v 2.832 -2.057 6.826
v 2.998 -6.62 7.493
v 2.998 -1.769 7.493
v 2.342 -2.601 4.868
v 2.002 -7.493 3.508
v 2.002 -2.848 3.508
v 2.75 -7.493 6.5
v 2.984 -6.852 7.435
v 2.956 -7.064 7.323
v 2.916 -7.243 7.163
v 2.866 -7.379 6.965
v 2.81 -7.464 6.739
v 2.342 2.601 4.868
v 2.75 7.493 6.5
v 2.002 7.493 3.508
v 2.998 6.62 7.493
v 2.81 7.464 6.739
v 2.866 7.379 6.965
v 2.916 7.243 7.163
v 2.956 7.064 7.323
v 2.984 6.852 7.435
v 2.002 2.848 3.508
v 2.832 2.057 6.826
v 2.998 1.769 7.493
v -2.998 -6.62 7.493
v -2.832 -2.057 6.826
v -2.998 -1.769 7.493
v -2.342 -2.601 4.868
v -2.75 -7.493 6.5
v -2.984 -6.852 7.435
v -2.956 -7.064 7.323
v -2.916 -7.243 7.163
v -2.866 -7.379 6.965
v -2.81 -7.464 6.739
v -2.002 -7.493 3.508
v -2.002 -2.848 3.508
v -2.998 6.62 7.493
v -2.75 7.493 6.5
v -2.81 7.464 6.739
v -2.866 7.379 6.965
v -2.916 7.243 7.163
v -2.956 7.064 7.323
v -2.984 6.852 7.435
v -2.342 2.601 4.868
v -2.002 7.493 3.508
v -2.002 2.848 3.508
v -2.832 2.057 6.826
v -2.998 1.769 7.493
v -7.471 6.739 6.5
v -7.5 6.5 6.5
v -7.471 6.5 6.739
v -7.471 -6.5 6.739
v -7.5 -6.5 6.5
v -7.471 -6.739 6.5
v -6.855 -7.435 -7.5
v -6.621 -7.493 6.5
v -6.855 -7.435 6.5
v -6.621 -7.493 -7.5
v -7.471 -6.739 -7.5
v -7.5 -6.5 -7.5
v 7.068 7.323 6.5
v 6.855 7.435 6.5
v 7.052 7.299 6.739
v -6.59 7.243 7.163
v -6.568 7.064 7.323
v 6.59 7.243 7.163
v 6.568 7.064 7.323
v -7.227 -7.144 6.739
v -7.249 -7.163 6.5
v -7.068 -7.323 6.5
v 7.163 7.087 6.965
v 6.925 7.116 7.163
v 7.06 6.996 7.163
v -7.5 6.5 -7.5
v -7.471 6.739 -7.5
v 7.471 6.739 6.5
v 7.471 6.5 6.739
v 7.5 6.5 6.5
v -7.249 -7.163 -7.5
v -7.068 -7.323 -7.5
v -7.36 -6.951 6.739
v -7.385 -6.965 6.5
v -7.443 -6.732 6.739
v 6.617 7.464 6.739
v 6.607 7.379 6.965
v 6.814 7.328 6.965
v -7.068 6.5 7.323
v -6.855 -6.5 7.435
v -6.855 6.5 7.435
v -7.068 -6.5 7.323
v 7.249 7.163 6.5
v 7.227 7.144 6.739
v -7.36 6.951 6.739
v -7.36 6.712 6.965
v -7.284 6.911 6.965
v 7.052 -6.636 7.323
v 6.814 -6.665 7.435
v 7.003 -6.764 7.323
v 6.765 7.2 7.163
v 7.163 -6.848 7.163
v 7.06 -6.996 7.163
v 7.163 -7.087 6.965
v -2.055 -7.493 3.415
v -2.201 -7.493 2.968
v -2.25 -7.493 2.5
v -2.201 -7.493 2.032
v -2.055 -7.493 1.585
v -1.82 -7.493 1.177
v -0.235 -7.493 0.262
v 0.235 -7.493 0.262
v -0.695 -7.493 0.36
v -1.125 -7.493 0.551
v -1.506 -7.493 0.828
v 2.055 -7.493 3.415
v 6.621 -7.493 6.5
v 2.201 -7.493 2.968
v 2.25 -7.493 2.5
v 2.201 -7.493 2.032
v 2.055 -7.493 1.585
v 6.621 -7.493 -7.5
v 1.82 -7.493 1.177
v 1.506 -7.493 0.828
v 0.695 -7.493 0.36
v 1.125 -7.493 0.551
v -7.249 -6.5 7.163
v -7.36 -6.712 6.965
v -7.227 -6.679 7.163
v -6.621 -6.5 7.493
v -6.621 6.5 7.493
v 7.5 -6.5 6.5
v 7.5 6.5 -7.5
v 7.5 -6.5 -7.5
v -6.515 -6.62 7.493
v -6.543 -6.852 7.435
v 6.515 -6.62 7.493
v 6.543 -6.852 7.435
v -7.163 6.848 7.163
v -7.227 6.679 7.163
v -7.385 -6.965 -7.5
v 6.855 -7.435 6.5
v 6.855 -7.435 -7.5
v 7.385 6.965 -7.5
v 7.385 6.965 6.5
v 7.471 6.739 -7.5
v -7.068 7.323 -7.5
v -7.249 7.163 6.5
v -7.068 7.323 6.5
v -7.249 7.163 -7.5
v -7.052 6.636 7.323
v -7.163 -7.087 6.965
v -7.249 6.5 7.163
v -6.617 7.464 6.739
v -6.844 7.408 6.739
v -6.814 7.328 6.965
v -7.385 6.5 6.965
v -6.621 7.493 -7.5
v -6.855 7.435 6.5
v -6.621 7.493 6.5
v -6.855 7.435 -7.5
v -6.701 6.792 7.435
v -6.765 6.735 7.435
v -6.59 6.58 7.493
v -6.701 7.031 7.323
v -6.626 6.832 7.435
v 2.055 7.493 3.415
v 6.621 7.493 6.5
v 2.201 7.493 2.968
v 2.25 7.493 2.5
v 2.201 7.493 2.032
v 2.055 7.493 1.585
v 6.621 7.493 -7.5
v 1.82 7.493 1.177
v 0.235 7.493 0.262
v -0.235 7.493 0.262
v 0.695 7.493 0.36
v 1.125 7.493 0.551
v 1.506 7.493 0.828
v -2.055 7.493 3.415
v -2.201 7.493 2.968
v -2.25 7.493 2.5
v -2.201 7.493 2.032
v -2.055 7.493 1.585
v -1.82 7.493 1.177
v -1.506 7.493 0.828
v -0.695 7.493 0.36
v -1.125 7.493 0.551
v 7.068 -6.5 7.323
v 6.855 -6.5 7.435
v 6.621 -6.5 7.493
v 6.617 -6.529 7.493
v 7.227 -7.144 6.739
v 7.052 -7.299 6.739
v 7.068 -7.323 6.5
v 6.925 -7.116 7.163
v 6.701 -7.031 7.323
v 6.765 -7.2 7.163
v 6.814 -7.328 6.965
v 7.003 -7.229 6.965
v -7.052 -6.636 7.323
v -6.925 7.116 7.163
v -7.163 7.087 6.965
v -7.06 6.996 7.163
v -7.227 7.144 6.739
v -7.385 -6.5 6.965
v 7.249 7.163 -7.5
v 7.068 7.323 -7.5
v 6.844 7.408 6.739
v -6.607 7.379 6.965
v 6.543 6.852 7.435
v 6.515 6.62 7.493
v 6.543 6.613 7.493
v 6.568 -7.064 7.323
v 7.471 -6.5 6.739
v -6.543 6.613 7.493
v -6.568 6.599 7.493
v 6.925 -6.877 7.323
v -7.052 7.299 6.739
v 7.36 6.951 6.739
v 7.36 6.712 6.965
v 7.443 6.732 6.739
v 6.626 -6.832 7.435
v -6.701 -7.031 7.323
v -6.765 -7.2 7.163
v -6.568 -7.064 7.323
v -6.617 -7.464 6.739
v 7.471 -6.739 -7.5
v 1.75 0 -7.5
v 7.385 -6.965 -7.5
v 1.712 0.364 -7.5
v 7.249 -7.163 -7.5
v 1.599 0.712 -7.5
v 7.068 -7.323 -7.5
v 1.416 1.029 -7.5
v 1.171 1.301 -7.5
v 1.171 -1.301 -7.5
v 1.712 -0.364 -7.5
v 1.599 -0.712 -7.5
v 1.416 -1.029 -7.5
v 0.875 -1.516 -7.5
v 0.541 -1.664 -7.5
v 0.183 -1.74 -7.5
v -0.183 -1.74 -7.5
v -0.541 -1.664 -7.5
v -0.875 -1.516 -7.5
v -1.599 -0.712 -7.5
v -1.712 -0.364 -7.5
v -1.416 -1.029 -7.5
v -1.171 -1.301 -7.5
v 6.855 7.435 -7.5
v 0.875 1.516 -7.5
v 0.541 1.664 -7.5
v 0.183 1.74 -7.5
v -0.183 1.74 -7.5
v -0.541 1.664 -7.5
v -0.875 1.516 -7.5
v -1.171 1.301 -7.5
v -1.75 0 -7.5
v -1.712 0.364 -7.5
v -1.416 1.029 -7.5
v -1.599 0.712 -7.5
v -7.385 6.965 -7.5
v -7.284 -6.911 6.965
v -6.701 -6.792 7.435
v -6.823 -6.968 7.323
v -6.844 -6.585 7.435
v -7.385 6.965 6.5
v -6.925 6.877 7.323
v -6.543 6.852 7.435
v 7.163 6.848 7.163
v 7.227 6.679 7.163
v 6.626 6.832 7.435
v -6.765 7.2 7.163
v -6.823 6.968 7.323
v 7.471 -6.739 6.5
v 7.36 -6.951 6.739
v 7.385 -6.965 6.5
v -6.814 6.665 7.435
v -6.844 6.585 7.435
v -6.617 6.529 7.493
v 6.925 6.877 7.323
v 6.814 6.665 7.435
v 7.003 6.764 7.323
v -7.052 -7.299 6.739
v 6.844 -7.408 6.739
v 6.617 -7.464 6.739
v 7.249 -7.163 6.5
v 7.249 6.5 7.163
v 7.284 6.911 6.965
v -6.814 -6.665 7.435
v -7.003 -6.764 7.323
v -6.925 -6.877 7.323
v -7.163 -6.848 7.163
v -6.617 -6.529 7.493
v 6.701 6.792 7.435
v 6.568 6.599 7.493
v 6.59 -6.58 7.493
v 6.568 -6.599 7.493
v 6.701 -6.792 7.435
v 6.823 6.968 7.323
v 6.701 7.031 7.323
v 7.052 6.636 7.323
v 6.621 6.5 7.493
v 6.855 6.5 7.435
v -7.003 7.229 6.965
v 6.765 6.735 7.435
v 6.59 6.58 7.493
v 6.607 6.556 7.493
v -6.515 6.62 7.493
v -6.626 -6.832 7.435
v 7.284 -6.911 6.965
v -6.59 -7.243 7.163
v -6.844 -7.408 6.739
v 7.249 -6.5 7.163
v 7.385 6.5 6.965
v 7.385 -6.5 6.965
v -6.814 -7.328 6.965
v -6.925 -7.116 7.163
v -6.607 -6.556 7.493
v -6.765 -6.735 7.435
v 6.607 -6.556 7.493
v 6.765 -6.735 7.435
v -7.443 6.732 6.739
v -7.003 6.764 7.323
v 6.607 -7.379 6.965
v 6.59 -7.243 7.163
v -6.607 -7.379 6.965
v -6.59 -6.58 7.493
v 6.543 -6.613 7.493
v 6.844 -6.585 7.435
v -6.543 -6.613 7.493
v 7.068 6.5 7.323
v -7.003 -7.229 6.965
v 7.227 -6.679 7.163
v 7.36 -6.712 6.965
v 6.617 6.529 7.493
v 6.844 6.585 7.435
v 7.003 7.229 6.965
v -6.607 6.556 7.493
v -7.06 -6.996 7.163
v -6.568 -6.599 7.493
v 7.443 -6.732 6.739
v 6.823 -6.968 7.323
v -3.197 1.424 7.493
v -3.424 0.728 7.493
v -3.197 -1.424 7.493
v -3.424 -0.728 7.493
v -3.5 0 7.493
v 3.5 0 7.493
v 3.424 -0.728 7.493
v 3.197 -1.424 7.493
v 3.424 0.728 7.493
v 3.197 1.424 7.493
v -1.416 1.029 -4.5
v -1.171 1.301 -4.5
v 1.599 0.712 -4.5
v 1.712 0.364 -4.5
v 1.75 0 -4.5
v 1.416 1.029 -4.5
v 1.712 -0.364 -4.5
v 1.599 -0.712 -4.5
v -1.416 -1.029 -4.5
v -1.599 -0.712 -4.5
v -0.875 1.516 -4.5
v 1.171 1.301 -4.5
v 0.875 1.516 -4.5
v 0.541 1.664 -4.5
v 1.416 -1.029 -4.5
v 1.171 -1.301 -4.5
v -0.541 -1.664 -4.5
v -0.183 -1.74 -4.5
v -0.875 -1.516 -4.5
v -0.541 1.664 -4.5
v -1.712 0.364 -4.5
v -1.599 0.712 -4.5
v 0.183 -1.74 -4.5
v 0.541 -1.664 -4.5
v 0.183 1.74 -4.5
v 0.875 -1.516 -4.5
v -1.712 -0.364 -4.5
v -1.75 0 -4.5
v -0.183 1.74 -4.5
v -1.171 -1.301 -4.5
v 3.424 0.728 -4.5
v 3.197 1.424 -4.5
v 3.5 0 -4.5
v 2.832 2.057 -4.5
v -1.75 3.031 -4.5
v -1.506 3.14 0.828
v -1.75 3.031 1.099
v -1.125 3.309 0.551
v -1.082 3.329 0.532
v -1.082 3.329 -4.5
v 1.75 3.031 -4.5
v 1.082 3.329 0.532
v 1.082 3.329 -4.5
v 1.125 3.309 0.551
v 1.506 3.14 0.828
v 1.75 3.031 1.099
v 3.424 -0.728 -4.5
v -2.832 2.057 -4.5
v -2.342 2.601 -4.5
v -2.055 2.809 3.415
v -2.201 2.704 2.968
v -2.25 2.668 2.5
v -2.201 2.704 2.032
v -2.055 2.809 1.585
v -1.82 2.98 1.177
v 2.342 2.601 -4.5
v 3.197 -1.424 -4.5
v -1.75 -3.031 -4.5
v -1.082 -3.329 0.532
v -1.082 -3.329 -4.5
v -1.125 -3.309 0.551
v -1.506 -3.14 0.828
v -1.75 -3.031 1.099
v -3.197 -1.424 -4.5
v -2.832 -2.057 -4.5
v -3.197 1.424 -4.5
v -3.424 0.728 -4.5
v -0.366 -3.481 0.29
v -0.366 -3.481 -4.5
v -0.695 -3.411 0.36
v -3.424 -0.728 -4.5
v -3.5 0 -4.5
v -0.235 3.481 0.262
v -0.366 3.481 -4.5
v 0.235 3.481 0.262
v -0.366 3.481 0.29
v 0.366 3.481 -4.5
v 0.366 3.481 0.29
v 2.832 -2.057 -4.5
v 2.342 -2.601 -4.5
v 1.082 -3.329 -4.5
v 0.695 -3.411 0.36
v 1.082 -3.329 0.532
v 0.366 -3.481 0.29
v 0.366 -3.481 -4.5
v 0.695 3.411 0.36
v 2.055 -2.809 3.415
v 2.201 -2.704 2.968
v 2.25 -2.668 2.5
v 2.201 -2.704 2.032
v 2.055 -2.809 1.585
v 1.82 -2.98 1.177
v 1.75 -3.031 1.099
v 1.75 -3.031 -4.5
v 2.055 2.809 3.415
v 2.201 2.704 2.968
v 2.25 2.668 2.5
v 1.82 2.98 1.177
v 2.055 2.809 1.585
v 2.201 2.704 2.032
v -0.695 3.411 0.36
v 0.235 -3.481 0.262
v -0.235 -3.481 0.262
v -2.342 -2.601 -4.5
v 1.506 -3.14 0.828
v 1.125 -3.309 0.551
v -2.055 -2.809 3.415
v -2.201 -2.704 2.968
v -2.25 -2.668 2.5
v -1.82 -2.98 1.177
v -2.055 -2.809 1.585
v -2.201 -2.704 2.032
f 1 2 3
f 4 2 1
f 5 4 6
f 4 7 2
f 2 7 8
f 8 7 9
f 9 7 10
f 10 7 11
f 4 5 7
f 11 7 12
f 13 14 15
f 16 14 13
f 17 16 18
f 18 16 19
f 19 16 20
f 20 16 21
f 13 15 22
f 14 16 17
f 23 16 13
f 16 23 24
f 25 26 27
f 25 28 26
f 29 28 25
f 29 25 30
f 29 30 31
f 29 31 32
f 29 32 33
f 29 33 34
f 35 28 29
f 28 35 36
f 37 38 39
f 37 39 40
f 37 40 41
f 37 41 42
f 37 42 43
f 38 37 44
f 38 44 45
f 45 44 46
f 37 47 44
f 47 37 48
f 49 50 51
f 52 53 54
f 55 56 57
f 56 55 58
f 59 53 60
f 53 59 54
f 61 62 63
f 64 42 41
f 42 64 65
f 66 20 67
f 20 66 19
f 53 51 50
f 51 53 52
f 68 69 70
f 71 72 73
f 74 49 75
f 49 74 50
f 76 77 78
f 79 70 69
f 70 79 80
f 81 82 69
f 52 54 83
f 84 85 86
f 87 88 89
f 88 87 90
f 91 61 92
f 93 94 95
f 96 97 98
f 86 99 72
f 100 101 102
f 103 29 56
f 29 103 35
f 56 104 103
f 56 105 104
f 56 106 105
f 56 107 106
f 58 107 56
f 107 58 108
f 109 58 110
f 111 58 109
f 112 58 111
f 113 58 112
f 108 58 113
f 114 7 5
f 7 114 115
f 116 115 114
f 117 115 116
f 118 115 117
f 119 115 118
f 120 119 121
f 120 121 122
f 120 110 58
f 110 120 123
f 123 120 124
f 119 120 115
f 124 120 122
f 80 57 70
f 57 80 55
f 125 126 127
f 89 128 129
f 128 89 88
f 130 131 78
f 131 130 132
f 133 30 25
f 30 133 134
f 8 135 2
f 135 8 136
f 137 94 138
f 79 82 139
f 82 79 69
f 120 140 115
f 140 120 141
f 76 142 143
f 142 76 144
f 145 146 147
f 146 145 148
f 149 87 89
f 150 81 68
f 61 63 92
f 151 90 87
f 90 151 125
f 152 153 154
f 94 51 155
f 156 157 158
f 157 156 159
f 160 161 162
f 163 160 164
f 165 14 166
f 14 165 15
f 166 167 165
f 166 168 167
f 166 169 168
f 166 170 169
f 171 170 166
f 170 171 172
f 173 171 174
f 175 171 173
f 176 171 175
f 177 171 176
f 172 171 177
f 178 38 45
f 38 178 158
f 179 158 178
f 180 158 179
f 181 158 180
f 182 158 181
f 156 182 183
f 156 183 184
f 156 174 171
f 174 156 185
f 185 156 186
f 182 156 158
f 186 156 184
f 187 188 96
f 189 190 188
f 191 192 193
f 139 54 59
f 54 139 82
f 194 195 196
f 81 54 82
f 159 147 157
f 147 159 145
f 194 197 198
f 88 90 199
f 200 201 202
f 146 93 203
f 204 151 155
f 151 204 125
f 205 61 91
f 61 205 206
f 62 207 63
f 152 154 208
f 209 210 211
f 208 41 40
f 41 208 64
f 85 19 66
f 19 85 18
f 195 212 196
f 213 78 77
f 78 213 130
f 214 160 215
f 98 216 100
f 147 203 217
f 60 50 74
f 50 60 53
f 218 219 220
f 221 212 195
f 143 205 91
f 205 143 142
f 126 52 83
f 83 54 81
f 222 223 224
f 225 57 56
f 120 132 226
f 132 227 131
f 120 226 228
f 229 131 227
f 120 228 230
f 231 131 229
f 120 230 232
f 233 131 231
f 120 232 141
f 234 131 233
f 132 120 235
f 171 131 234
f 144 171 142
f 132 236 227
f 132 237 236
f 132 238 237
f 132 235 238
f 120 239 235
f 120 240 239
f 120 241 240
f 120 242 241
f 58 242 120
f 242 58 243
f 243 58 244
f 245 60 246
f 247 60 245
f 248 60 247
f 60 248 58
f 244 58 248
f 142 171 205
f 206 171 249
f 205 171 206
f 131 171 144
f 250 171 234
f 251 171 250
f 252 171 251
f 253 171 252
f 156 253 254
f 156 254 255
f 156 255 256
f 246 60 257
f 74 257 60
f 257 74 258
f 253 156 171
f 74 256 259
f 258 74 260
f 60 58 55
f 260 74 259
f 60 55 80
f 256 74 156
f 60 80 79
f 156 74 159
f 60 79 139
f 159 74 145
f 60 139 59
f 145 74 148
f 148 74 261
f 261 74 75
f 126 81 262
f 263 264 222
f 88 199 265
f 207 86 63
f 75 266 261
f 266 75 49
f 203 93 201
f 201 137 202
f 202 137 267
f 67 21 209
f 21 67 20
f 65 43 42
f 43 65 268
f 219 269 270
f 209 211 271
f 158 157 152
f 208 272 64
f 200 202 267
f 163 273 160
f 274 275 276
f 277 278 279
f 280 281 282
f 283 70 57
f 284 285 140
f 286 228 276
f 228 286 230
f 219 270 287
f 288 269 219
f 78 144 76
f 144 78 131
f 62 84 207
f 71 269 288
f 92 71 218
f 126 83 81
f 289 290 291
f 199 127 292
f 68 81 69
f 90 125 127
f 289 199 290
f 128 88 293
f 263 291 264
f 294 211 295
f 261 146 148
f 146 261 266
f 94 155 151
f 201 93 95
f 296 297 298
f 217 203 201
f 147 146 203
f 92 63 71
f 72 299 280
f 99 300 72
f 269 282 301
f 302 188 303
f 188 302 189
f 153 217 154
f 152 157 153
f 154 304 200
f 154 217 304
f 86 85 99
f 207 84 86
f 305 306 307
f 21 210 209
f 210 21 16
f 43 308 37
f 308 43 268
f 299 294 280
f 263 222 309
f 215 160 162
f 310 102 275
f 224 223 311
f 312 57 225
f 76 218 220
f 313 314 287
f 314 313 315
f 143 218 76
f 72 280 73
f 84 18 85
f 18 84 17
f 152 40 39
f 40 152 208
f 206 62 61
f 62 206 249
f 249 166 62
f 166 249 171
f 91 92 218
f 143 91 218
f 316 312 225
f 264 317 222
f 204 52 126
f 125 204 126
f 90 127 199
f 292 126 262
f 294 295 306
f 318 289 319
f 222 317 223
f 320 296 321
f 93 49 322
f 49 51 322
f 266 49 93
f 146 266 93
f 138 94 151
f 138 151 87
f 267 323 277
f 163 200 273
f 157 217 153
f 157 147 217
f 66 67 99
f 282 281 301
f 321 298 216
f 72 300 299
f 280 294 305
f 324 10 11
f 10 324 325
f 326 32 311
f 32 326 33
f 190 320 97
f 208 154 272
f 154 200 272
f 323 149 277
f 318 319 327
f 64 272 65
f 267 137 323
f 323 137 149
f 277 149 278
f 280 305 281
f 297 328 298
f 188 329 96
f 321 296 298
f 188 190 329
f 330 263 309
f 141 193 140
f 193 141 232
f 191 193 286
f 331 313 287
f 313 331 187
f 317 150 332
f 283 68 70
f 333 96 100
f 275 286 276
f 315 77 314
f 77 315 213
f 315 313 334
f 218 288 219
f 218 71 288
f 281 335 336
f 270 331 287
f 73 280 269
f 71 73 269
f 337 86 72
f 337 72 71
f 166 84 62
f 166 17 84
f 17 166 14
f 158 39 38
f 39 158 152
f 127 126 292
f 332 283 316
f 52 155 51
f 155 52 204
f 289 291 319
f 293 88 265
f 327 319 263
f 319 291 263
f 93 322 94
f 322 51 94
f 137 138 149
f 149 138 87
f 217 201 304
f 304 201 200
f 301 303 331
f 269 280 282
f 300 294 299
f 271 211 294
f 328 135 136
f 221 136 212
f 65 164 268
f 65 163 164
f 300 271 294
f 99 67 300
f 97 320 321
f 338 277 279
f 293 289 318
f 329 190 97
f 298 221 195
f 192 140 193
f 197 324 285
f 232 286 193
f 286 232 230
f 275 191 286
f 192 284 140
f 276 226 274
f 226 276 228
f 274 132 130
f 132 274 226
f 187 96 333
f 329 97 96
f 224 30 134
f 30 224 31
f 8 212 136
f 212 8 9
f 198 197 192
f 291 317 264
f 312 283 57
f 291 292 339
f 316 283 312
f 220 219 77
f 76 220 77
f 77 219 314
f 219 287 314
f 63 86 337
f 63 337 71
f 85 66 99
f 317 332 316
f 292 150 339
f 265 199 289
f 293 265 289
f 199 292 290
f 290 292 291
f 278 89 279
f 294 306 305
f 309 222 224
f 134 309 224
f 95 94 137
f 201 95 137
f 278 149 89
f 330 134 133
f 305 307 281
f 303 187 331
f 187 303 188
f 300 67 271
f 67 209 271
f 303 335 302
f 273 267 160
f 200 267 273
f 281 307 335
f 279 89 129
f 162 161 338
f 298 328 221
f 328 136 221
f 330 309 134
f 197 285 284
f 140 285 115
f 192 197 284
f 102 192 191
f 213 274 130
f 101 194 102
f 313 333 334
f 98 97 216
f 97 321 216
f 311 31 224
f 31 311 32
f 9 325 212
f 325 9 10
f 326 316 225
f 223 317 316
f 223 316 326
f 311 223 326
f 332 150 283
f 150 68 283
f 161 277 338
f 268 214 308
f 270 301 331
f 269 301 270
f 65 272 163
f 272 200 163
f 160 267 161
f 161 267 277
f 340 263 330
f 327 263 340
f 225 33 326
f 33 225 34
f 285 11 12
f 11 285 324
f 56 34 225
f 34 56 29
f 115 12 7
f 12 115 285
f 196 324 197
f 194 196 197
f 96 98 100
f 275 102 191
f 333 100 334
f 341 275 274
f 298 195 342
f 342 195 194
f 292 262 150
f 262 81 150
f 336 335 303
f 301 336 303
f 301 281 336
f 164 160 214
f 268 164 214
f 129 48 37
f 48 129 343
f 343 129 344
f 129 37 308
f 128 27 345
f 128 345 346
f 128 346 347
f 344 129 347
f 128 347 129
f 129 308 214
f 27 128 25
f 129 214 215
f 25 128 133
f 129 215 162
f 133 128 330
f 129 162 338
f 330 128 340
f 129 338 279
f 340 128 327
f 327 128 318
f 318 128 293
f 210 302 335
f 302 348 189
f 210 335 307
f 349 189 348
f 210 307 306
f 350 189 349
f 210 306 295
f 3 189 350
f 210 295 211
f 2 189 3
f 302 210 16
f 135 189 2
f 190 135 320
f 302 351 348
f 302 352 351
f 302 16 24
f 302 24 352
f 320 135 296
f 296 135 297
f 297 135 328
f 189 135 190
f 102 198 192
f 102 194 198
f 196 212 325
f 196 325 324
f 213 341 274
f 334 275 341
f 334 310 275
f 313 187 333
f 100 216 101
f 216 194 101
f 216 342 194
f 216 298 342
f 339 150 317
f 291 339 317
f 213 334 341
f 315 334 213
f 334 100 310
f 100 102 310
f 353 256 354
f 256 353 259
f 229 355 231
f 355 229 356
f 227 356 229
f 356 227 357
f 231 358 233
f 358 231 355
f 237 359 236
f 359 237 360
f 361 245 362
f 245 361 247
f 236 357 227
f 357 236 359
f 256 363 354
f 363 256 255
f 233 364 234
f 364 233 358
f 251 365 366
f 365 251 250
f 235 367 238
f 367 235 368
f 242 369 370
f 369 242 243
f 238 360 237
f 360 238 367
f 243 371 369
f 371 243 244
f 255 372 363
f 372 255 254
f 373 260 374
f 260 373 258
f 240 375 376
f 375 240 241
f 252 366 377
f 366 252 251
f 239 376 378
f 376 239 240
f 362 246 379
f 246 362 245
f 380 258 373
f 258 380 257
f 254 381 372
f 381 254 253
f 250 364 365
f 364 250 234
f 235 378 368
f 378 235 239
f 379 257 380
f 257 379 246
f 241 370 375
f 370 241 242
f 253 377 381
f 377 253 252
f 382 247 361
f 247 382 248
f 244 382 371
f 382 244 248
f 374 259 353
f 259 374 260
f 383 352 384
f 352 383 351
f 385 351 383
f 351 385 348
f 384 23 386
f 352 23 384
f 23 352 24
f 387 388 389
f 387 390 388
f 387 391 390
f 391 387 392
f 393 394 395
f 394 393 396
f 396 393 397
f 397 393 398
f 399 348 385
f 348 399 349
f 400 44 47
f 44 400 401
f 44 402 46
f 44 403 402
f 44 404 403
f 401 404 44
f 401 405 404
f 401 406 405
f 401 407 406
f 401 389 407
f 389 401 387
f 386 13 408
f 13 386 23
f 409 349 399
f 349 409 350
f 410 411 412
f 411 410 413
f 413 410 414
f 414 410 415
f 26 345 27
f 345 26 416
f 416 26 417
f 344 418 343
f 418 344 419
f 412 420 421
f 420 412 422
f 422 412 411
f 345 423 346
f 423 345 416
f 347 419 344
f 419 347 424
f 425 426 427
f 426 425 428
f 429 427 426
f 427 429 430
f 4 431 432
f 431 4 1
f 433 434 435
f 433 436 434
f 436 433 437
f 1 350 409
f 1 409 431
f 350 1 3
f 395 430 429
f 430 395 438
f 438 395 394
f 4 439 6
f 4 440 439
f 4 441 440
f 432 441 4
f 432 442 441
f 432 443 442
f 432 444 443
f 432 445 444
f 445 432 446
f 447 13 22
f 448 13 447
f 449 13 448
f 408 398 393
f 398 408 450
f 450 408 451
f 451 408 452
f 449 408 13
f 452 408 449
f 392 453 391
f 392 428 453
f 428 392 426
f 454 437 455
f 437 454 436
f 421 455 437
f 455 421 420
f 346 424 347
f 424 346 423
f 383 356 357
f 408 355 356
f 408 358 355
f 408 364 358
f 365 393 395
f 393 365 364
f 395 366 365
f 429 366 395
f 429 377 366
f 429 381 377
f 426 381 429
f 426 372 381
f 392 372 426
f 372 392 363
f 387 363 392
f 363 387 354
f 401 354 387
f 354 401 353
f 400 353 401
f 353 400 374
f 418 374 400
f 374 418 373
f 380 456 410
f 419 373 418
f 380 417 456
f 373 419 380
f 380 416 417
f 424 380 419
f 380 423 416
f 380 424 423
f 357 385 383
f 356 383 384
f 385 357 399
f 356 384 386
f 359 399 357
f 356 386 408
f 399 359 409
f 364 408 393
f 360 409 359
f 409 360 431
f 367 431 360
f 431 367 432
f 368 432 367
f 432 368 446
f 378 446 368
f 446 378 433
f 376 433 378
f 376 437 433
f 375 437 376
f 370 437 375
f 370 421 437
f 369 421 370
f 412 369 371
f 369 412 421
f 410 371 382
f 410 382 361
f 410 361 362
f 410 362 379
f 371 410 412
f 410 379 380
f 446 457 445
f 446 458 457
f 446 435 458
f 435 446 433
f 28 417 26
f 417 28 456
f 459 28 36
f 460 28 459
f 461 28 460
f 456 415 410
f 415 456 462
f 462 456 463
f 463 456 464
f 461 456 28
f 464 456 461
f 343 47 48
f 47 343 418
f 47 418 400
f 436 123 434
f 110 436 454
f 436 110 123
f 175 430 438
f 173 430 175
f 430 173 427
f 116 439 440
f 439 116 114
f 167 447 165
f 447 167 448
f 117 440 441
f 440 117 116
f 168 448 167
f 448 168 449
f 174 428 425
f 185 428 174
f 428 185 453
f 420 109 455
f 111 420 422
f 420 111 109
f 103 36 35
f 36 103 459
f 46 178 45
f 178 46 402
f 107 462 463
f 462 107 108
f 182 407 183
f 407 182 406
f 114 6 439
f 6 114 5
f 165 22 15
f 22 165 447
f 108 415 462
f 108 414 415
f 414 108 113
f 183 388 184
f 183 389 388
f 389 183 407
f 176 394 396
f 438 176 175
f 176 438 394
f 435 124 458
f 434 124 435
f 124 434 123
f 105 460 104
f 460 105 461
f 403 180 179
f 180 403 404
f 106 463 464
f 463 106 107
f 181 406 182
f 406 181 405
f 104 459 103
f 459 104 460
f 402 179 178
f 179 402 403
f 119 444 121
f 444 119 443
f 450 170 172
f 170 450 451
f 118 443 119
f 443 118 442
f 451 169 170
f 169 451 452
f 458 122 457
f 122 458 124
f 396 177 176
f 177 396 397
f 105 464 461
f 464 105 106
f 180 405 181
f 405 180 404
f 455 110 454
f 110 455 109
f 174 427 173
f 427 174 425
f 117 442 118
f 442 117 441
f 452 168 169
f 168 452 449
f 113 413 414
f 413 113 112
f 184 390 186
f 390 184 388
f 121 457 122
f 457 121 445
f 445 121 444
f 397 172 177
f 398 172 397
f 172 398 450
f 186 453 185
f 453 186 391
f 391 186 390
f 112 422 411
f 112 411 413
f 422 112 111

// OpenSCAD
// AntennaClip

// rendering options
hole_roundness = 30;
// Set to 0.01 for higher definition curves (renders slower)
$fs = 0.25;

// base measurements
baseX = 15;
baseY = 15;
baseZ = 15;

baseRadius = 1;

centerIs = true;

// screw dimensions
screwDia = 3;
screwHeadDia = 6;

screwBottomThickness = 3;

screwDiaExtra = 0.5;
screwHeadDiaExtra = 1;

// antenna hole
antennaDia = 4.5;
antennaHoleCenter = 10;

// antenna wedge
wedgeWidth = 10;
wedgeLength = 20;

wedgePointZ = 3;

// create base cube
union() {
     difference() {
	  // draw base
          //color("Yellow")
	  roundedcube([baseX, baseY, baseZ], centerIs, baseRadius, "zmax");
	  
	  // screw hole
	  cylinder(baseZ, screwDia / 2 + screwDiaExtra / 2, screwDia / 2 + screwDiaExtra / 2, centerIs);
	  
	  // screw head hole
	  translate(v = [0, 0, screwBottomThickness])
	       cylinder(baseZ, screwHeadDia / 2 + screwHeadDiaExtra / 2, screwHeadDia / 2 + screwHeadDiaExtra / 2, centerIs);
	  
	  // antenna hole
	  translate(v = [0, 0, -baseZ / 2 + antennaHoleCenter])
	       rotate(a=[90, 0, 0])
	       cylinder(baseY, antennaDia / 2, antennaDia / 2, antennaDia, center = centerIs);
	  
	  // antenna wedge
	  difference() {
	       translate(v = [0, -baseY / 2, -baseZ / 2 + wedgePointZ ])
		    rotate(a=[90, 0, 90])
		    wedge(baseY, wedgeLength, wedgeWidth);
	       translate(v = [0, 0, -baseZ / 2 + antennaHoleCenter - antennaDia ])
		    cube(size = [baseX, baseY, baseZ / 2], center = centerIs);
	  }
     }
}

// More information: https://danielupshaw.com/openscad-rounded-corners/
module roundedcube(size = [1, 1, 1], center = false, radius = 0.5, apply_to = "all") {
     // If single value, convert to [x, y, z] vector
     size = (size[0] == undef) ? [size, size, size] : size;
     
     translate_min = radius;
     translate_xmax = size[0] - radius;
     translate_ymax = size[1] - radius;
     translate_zmax = size[2] - radius;
     
     diameter = radius * 2;
     
     obj_translate = (center == false) ?
	  [0, 0, 0] : [
	       -(size[0] / 2),
	       -(size[1] / 2),
	       -(size[2] / 2)
	       ];
     
     translate(v = obj_translate) {
	  hull() {
	       for (translate_x = [translate_min, translate_xmax]) {
		    x_at = (translate_x == translate_min) ? "min" : "max";
		    for (translate_y = [translate_min, translate_ymax]) {
			 y_at = (translate_y == translate_min) ? "min" : "max";
			 for (translate_z = [translate_min, translate_zmax]) {
			      z_at = (translate_z == translate_min) ? "min" : "max";
			      
			      translate(v = [translate_x, translate_y, translate_z])
				   if (
					(apply_to == "all") ||
					(apply_to == "xmin" && x_at == "min") || (apply_to == "xmax" && x_at == "max") ||
					(apply_to == "ymin" && y_at == "min") || (apply_to == "ymax" && y_at == "max") ||
					(apply_to == "zmin" && z_at == "min") || (apply_to == "zmax" && z_at == "max")
					) {
					sphere(r = radius);
				   } else {
					rotate = 
					     (apply_to == "xmin" || apply_to == "xmax" || apply_to == "x") ? [0, 90, 0] : (
						  (apply_to == "ymin" || apply_to == "ymax" || apply_to == "y") ? [90, 90, 0] :
						  [0, 0, 0]
						  );
					rotate(a = rotate)
					     cylinder(h = diameter, r = radius, center = true);
				   }
			 }
		    }
	       }
	  }
     }
}

module wedge(l, w, h){
	  polyhedron(
          points=[[0,0,0], [l,0,0], [l,w,-h/2], [0,w,-h/2], [0,w,h/2], [l,w,h/2]],
          faces=[[0,1,2,3],[5,4,3,2],[0,4,5,1],[0,3,4],[5,2,1]]
          );
}
